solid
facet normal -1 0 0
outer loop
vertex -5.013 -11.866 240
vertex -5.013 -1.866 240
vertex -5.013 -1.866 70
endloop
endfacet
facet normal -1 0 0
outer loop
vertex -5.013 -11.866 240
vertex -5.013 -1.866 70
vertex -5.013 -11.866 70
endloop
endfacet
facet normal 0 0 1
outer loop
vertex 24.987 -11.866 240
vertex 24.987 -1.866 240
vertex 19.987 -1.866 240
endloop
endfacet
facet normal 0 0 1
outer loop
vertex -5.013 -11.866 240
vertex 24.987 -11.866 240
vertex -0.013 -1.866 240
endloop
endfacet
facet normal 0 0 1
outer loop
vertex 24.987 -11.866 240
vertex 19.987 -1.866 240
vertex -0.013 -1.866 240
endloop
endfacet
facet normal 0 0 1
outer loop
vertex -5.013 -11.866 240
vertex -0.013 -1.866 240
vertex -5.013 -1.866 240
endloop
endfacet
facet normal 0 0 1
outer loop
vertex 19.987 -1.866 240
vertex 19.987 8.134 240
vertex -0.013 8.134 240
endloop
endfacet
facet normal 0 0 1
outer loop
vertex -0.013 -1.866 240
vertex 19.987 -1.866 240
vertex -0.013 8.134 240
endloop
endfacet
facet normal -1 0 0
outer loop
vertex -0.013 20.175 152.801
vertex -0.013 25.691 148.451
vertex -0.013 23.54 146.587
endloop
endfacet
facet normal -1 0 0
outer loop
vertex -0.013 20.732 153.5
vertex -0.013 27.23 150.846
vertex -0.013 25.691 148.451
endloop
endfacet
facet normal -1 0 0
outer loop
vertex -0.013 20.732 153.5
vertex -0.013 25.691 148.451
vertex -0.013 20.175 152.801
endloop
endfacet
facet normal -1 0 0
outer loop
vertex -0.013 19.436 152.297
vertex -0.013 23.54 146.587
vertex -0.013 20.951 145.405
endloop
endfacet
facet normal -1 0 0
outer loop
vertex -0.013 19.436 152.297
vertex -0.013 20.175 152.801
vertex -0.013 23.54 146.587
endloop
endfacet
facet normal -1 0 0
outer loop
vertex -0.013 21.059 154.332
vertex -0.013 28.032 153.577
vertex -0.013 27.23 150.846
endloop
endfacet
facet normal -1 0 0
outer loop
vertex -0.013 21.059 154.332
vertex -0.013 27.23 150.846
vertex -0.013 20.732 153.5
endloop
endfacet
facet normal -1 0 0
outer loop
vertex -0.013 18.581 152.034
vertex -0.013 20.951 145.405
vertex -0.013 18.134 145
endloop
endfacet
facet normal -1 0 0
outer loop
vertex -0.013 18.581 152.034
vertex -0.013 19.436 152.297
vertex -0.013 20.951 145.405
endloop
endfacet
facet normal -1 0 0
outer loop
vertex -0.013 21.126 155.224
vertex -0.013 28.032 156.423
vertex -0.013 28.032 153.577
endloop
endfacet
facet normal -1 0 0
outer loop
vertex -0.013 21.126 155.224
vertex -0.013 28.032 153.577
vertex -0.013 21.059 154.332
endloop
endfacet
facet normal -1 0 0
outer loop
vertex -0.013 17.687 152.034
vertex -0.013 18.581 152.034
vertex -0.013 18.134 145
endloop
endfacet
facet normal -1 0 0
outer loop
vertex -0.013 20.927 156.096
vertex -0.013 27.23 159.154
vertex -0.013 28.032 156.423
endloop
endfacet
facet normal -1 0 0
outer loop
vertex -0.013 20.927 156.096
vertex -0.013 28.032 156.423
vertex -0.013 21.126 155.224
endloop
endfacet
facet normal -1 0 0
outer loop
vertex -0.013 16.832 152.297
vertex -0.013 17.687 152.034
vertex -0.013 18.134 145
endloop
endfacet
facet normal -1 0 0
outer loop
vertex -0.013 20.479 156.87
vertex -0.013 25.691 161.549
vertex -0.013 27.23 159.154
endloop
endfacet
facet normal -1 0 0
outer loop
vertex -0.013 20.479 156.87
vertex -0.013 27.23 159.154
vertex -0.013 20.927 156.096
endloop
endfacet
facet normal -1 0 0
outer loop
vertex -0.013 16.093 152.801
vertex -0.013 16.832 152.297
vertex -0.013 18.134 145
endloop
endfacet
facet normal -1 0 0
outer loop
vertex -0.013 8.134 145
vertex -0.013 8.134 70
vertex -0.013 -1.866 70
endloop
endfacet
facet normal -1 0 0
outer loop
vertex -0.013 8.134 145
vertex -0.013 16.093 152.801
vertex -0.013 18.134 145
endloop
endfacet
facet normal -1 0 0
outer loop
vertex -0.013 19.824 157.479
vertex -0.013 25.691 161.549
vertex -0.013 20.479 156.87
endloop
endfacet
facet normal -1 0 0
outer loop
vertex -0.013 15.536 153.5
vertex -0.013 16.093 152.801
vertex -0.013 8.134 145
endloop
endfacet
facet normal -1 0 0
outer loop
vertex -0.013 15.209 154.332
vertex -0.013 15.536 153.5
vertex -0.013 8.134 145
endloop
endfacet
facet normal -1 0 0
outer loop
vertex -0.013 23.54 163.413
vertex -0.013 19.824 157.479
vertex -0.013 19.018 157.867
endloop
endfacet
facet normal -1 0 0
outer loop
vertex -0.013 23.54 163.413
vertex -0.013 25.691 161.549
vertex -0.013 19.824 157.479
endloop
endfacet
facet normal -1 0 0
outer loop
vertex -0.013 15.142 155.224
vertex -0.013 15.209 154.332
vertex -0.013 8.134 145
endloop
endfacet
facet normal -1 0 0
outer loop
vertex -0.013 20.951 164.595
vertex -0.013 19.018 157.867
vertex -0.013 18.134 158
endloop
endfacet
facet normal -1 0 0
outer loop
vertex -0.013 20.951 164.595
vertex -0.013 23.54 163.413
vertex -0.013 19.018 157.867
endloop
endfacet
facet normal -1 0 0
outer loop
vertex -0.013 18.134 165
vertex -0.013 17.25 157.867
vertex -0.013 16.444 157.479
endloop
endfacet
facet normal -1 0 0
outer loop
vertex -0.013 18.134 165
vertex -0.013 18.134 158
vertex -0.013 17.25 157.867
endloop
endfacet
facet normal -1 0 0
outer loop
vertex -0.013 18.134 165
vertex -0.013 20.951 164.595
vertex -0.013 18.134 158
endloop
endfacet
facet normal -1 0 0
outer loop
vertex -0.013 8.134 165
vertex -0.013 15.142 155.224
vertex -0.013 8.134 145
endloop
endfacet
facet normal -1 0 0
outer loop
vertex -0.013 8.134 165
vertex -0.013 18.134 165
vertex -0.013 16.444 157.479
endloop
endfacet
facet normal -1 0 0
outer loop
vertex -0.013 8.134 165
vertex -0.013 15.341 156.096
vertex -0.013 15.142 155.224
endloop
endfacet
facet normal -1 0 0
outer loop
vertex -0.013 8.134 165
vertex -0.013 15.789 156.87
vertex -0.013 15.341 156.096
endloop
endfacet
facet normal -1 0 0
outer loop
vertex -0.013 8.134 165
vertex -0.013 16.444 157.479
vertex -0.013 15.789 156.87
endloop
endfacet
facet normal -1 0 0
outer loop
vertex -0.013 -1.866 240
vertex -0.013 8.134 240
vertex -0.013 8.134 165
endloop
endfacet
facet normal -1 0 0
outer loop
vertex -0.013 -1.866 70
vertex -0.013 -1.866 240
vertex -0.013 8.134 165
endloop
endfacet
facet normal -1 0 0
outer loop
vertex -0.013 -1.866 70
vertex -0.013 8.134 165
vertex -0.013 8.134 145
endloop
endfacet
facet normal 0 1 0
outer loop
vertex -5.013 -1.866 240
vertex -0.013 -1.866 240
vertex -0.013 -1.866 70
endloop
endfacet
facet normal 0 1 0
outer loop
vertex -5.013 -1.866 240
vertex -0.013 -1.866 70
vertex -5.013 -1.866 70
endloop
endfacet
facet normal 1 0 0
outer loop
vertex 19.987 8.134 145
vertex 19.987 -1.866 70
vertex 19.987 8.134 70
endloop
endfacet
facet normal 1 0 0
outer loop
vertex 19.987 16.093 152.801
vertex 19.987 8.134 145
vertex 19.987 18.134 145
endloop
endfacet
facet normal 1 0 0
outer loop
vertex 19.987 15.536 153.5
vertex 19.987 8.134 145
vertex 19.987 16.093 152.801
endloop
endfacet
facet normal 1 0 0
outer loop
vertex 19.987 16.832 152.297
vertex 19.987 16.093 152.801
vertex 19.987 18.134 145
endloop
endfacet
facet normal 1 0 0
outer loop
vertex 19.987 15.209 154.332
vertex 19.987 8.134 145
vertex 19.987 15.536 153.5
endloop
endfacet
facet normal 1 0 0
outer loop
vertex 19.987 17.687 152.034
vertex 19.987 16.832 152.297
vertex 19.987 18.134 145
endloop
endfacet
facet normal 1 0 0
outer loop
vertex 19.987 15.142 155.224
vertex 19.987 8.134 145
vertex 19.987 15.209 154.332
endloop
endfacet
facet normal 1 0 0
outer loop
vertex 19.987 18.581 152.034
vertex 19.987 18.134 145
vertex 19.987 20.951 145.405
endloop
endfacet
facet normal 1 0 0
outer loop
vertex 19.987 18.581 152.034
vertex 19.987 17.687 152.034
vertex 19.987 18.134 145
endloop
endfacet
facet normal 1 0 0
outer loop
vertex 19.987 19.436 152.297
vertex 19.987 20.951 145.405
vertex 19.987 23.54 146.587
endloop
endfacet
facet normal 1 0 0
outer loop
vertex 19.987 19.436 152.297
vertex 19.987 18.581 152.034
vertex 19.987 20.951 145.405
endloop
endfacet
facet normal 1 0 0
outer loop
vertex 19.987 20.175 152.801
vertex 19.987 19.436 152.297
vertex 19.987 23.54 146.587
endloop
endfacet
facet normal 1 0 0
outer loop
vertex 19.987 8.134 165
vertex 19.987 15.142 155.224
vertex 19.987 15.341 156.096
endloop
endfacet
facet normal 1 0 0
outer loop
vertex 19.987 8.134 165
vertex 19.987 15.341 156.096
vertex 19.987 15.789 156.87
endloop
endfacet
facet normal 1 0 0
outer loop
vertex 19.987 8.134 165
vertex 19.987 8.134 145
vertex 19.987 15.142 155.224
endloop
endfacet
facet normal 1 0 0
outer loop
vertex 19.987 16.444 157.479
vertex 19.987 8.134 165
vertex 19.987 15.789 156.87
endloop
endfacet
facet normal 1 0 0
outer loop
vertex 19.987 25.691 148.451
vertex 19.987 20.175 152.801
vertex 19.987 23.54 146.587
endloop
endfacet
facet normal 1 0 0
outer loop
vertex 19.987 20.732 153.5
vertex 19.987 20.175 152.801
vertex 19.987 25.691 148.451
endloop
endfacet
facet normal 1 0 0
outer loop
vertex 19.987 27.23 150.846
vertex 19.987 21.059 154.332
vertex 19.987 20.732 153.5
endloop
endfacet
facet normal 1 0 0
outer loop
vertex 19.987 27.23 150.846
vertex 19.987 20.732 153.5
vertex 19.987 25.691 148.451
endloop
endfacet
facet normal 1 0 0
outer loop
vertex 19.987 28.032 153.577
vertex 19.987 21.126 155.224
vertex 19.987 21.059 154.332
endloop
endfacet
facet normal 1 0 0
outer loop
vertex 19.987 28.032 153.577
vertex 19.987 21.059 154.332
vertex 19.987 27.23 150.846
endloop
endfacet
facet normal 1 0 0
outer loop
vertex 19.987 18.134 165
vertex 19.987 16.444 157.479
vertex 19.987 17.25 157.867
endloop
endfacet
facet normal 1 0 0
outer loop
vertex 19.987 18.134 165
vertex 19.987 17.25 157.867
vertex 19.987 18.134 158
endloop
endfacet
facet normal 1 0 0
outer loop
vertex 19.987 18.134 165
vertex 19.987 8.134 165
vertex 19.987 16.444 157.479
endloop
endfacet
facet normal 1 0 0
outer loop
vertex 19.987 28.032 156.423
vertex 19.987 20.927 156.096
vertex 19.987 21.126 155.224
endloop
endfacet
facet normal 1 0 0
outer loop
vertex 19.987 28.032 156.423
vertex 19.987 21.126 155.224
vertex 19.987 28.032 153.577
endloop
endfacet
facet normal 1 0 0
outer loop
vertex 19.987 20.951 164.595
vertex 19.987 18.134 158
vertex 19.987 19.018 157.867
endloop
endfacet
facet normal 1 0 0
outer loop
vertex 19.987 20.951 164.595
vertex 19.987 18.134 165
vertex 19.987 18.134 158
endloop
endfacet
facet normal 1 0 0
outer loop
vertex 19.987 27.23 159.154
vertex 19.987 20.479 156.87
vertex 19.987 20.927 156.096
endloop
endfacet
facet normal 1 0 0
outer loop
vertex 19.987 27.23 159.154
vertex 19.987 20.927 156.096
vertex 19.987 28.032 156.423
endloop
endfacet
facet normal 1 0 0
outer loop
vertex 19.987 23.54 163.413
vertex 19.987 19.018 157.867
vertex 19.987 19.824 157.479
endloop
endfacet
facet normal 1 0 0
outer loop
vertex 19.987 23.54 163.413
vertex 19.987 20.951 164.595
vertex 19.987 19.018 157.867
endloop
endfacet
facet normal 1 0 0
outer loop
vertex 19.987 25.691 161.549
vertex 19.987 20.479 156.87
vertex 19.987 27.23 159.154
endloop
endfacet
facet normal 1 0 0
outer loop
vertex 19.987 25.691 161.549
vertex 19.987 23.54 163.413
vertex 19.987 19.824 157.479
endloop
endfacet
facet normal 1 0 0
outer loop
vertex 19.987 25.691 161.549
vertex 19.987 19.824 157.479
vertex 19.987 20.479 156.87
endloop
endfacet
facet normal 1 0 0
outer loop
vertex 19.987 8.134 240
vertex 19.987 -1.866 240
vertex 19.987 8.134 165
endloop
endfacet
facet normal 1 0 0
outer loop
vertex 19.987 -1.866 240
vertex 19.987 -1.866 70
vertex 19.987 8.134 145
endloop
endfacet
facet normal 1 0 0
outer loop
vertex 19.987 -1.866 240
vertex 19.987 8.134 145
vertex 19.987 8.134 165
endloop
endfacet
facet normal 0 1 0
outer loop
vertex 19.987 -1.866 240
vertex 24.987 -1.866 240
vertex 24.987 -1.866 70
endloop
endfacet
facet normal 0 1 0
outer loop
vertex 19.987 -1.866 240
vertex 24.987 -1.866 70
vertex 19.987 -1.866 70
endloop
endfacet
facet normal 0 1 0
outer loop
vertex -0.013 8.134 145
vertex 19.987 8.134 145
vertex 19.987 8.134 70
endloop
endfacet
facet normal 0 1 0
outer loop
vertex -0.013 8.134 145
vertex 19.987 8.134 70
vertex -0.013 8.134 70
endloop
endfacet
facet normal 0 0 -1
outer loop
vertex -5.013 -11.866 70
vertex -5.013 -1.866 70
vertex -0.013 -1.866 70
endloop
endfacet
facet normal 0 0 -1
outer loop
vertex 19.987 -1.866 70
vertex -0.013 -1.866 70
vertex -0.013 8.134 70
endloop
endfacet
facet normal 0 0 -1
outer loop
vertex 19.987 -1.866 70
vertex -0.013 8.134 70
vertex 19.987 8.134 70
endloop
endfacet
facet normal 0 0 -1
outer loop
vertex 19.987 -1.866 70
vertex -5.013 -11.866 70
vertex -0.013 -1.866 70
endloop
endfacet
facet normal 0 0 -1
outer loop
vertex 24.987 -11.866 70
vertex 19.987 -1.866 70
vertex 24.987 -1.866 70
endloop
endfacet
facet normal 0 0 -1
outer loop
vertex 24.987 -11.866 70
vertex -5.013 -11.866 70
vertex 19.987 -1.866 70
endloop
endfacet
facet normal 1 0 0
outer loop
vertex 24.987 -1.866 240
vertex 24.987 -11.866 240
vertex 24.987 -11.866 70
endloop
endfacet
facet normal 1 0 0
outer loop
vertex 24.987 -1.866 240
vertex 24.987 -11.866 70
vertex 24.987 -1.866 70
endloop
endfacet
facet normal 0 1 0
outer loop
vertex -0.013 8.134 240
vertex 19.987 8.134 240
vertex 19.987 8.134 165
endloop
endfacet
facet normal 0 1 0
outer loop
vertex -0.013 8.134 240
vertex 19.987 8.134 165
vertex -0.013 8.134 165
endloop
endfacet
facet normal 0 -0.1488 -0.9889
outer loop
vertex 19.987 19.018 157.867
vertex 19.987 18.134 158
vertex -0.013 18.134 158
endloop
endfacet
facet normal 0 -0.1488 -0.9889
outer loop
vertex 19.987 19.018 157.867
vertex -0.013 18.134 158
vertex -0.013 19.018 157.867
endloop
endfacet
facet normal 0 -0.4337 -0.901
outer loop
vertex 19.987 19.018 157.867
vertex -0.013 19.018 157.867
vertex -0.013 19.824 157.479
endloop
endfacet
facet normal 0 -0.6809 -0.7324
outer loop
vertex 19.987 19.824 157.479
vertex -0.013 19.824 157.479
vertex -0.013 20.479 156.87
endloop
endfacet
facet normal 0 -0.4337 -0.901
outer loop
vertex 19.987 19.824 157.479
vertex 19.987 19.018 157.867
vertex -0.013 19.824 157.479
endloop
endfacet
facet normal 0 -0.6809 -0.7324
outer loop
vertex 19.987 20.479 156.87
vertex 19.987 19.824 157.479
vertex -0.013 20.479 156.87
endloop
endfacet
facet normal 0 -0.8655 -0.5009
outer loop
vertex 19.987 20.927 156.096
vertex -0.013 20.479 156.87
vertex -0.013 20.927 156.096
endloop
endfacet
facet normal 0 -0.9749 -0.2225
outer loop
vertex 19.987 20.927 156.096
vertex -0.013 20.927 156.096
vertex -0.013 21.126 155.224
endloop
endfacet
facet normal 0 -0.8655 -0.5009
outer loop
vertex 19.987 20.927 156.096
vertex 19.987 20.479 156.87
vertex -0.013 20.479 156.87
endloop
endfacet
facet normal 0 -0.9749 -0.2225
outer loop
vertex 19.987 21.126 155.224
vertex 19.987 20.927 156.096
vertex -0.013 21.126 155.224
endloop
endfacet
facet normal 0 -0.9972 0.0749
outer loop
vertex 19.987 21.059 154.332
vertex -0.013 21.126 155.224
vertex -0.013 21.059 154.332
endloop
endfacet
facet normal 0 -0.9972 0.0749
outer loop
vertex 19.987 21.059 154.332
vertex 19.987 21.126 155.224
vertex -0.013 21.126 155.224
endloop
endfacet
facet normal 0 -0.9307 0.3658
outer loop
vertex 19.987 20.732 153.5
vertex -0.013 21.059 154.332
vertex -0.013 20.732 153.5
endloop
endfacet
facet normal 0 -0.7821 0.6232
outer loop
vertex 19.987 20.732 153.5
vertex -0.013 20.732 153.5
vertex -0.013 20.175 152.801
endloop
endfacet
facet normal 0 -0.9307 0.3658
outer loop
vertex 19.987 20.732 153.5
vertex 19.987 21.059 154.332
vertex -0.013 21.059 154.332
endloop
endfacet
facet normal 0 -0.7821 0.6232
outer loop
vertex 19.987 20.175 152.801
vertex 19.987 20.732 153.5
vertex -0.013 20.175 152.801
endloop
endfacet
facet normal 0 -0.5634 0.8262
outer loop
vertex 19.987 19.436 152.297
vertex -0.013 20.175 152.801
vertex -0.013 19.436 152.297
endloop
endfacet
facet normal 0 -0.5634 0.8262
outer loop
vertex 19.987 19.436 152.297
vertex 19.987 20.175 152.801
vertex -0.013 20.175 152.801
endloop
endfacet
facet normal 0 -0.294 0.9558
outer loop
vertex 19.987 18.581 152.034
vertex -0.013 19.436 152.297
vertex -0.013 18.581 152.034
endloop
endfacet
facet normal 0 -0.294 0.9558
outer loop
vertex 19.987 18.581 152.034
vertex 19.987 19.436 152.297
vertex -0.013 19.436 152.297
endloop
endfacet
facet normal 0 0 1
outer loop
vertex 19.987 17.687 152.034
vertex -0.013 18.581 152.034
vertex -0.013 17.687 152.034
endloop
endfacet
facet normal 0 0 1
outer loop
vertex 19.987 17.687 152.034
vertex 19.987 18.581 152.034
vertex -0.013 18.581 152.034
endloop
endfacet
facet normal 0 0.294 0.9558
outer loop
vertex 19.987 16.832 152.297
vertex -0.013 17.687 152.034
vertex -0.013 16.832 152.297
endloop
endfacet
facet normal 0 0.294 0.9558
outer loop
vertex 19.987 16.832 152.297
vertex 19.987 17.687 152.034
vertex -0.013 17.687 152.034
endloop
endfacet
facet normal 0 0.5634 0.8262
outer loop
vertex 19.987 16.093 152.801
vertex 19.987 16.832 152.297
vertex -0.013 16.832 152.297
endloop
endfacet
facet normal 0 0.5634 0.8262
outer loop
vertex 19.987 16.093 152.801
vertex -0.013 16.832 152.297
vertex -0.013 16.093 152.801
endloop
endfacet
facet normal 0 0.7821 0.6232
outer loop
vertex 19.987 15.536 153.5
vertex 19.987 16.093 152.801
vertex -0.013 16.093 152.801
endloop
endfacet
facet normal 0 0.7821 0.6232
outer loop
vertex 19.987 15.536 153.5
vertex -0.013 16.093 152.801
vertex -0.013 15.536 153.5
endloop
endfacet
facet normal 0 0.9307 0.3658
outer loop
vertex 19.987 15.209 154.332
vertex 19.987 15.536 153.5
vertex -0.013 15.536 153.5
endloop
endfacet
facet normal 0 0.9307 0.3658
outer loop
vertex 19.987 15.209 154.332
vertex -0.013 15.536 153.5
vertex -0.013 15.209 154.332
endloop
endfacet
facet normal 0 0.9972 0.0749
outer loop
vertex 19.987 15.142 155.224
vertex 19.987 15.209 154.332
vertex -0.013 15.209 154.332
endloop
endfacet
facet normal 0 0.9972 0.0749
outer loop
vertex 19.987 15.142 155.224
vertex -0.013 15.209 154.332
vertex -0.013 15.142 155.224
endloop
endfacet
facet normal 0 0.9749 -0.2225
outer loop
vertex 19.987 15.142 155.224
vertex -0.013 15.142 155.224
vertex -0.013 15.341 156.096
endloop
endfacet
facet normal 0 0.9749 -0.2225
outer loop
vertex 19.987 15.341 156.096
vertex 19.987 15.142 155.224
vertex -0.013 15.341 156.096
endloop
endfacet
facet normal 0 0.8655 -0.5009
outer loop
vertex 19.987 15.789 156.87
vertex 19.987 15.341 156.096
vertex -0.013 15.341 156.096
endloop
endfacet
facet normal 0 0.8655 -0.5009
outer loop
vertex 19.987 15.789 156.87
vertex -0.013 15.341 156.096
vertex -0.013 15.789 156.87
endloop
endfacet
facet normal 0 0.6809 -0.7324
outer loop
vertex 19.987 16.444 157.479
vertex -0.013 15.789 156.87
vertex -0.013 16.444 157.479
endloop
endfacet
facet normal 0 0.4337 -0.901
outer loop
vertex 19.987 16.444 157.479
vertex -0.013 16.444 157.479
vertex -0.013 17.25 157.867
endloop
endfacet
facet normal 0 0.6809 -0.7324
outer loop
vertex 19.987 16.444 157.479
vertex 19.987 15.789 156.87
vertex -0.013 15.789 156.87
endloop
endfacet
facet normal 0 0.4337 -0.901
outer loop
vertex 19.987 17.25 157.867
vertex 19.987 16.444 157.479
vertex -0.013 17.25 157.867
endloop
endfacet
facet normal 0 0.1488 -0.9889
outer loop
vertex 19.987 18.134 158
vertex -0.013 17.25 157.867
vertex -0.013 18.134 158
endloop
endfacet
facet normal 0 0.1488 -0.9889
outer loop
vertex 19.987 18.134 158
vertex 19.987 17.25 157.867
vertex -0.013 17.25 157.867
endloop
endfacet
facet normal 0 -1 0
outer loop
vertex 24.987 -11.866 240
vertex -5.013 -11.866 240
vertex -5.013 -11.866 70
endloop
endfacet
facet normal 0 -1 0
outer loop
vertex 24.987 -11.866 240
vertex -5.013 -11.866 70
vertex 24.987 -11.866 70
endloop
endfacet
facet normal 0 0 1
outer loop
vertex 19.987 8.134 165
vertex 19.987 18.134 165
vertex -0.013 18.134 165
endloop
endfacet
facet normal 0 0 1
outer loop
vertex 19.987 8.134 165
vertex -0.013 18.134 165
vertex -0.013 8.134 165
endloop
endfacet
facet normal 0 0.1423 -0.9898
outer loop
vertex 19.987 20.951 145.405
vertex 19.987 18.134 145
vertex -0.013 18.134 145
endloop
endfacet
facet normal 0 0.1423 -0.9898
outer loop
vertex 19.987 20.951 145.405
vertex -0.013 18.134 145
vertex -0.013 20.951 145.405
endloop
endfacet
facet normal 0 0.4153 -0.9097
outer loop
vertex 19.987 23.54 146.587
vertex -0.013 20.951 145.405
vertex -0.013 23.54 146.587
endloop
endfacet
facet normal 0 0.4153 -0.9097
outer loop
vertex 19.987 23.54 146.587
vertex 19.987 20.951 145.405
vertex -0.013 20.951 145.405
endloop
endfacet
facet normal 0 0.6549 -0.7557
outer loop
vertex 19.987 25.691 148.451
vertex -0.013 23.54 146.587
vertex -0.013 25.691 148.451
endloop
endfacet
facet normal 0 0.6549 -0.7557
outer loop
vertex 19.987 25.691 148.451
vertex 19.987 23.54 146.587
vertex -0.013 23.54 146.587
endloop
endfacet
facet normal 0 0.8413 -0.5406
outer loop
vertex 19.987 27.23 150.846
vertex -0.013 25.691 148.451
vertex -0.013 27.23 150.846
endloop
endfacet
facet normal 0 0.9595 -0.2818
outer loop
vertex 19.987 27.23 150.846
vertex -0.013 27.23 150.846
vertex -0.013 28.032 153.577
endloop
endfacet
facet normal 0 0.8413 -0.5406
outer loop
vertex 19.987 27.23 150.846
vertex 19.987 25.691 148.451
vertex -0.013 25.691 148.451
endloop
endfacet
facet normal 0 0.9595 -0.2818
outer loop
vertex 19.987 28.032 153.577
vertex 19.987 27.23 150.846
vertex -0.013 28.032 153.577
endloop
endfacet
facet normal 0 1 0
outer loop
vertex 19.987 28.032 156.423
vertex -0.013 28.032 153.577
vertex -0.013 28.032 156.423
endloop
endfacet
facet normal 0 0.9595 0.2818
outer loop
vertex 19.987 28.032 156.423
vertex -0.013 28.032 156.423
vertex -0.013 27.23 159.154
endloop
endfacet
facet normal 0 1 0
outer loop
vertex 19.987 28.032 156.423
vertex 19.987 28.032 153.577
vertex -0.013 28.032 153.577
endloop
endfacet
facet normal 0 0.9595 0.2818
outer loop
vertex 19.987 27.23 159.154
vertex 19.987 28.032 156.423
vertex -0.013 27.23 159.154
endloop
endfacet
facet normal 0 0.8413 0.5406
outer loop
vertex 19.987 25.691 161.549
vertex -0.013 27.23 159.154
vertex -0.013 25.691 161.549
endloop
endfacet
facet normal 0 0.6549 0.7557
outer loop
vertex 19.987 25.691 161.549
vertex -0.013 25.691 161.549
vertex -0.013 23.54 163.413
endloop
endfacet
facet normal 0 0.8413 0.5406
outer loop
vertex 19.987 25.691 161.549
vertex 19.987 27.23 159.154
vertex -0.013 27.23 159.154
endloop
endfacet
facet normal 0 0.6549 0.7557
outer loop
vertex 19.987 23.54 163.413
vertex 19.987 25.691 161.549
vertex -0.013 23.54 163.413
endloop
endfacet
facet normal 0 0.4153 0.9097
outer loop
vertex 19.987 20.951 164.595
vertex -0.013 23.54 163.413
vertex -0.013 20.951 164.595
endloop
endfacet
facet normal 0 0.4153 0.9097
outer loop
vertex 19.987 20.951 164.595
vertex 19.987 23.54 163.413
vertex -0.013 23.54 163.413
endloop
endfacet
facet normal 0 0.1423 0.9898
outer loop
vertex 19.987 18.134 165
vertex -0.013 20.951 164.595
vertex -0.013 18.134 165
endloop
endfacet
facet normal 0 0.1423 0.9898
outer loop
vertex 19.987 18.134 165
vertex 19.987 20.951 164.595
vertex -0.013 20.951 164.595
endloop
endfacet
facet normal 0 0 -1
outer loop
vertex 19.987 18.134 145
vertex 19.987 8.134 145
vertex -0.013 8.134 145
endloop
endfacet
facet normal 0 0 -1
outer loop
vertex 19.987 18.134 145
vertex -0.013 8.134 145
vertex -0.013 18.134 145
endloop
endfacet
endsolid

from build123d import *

# Parameters (mm, degrees)
EXTRUDE_3_DEPTH     = 240
EXTRUDE_5_DEPTH     = 100
SKETCH_9_W          = 30
SKETCH_9_H          = 170
CUT_EXTRUDE_1_DEPTH = 60
EXTRUDE_6_DEPTH     = 20


with BuildPart() as part:
    # 草图1 → 凸台-拉伸3 (new body)
    with BuildSketch(Plane.XY):
        Polygon((24.986954743, -11.866003736), (-5.013045257, -11.866003736), (-5.013045257, -1.866003736), (-0.013045257, -1.866003736), (-0.013045257, 8.133996264), (19.986954743, 8.133996264), (19.986954743, -1.866003736), (24.986954743, -1.866003736), align=None)
    extrude(amount=EXTRUDE_3_DEPTH)

    # 草图4 → 凸台-拉伸5 (add)
    with BuildSketch(Plane(origin=(0, 0, 0), x_dir=(-1, 0, 0), z_dir=(0, 0, -1))):
        Polygon((-19.986954743, 8.133996264), (0.013045257, 8.133996264), (0.013045257, -1.866003736), (5.013045257, -1.866003736), (5.013045257, -11.866003736), (-24.986954743, -11.866003736), (-24.986954743, -1.866003736), (-19.986954743, -1.866003736), align=None)
    extrude(amount=EXTRUDE_5_DEPTH)

    # 草图9 → 切除-拉伸1 (cut)
    with BuildSketch(Plane.XZ.offset(11.866003736)):
        with Locations((9.986954743, -15)):
            Rectangle(SKETCH_9_W, SKETCH_9_H)
    extrude(amount=-CUT_EXTRUDE_1_DEPTH, mode=Mode.SUBTRACT)

    # 草图11 → 凸台-拉伸6 (add)
    with BuildSketch(Plane(origin=(19.986954743, 0, 0), x_dir=(0, 0, -1), z_dir=(1, 0, 0))):
        with BuildLine():
            ThreePointArc((-145, 18.133996264), (-155, 28.133996264), (-165, 18.133996264))
            Line((-165, 18.133996264), (-158, 18.133996264))
            ThreePointArc((-158, 18.133996264), (-155, 21.133996264), (-152, 18.133996264))
            Line((-152, 18.133996264), (-145, 18.133996264))
        make_face()
        with BuildLine():
            Line((-158, 18.133996264), (-165, 18.133996264))
            ThreePointArc((-165, 18.133996264), (-162.071067812, 11.062928453), (-155, 8.133996264))
            ThreePointArc((-155, 8.133996264), (-147.928932188, 11.062928453), (-145, 18.133996264))
            Line((-145, 18.133996264), (-152, 18.133996264))
            ThreePointArc((-152, 18.133996264), (-155, 15.133996264), (-158, 18.133996264))
        make_face()
        with BuildLine():
            ThreePointArc((-145, 18.133996264), (-147.928932188, 11.062928453), (-155, 8.133996264))
            Line((-155, 8.133996264), (-145, 8.133996264))
            Line((-145, 8.133996264), (-145, 18.133996264))
        make_face()
        with BuildLine():
            Line((-165, 18.133996264), (-165, 8.133996264))
            Line((-165, 8.133996264), (-155, 8.133996264))
            ThreePointArc((-155, 8.133996264), (-162.071067812, 11.062928453), (-165, 18.133996264))
        make_face()
    extrude(amount=-EXTRUDE_6_DEPTH)


solid = part.part
